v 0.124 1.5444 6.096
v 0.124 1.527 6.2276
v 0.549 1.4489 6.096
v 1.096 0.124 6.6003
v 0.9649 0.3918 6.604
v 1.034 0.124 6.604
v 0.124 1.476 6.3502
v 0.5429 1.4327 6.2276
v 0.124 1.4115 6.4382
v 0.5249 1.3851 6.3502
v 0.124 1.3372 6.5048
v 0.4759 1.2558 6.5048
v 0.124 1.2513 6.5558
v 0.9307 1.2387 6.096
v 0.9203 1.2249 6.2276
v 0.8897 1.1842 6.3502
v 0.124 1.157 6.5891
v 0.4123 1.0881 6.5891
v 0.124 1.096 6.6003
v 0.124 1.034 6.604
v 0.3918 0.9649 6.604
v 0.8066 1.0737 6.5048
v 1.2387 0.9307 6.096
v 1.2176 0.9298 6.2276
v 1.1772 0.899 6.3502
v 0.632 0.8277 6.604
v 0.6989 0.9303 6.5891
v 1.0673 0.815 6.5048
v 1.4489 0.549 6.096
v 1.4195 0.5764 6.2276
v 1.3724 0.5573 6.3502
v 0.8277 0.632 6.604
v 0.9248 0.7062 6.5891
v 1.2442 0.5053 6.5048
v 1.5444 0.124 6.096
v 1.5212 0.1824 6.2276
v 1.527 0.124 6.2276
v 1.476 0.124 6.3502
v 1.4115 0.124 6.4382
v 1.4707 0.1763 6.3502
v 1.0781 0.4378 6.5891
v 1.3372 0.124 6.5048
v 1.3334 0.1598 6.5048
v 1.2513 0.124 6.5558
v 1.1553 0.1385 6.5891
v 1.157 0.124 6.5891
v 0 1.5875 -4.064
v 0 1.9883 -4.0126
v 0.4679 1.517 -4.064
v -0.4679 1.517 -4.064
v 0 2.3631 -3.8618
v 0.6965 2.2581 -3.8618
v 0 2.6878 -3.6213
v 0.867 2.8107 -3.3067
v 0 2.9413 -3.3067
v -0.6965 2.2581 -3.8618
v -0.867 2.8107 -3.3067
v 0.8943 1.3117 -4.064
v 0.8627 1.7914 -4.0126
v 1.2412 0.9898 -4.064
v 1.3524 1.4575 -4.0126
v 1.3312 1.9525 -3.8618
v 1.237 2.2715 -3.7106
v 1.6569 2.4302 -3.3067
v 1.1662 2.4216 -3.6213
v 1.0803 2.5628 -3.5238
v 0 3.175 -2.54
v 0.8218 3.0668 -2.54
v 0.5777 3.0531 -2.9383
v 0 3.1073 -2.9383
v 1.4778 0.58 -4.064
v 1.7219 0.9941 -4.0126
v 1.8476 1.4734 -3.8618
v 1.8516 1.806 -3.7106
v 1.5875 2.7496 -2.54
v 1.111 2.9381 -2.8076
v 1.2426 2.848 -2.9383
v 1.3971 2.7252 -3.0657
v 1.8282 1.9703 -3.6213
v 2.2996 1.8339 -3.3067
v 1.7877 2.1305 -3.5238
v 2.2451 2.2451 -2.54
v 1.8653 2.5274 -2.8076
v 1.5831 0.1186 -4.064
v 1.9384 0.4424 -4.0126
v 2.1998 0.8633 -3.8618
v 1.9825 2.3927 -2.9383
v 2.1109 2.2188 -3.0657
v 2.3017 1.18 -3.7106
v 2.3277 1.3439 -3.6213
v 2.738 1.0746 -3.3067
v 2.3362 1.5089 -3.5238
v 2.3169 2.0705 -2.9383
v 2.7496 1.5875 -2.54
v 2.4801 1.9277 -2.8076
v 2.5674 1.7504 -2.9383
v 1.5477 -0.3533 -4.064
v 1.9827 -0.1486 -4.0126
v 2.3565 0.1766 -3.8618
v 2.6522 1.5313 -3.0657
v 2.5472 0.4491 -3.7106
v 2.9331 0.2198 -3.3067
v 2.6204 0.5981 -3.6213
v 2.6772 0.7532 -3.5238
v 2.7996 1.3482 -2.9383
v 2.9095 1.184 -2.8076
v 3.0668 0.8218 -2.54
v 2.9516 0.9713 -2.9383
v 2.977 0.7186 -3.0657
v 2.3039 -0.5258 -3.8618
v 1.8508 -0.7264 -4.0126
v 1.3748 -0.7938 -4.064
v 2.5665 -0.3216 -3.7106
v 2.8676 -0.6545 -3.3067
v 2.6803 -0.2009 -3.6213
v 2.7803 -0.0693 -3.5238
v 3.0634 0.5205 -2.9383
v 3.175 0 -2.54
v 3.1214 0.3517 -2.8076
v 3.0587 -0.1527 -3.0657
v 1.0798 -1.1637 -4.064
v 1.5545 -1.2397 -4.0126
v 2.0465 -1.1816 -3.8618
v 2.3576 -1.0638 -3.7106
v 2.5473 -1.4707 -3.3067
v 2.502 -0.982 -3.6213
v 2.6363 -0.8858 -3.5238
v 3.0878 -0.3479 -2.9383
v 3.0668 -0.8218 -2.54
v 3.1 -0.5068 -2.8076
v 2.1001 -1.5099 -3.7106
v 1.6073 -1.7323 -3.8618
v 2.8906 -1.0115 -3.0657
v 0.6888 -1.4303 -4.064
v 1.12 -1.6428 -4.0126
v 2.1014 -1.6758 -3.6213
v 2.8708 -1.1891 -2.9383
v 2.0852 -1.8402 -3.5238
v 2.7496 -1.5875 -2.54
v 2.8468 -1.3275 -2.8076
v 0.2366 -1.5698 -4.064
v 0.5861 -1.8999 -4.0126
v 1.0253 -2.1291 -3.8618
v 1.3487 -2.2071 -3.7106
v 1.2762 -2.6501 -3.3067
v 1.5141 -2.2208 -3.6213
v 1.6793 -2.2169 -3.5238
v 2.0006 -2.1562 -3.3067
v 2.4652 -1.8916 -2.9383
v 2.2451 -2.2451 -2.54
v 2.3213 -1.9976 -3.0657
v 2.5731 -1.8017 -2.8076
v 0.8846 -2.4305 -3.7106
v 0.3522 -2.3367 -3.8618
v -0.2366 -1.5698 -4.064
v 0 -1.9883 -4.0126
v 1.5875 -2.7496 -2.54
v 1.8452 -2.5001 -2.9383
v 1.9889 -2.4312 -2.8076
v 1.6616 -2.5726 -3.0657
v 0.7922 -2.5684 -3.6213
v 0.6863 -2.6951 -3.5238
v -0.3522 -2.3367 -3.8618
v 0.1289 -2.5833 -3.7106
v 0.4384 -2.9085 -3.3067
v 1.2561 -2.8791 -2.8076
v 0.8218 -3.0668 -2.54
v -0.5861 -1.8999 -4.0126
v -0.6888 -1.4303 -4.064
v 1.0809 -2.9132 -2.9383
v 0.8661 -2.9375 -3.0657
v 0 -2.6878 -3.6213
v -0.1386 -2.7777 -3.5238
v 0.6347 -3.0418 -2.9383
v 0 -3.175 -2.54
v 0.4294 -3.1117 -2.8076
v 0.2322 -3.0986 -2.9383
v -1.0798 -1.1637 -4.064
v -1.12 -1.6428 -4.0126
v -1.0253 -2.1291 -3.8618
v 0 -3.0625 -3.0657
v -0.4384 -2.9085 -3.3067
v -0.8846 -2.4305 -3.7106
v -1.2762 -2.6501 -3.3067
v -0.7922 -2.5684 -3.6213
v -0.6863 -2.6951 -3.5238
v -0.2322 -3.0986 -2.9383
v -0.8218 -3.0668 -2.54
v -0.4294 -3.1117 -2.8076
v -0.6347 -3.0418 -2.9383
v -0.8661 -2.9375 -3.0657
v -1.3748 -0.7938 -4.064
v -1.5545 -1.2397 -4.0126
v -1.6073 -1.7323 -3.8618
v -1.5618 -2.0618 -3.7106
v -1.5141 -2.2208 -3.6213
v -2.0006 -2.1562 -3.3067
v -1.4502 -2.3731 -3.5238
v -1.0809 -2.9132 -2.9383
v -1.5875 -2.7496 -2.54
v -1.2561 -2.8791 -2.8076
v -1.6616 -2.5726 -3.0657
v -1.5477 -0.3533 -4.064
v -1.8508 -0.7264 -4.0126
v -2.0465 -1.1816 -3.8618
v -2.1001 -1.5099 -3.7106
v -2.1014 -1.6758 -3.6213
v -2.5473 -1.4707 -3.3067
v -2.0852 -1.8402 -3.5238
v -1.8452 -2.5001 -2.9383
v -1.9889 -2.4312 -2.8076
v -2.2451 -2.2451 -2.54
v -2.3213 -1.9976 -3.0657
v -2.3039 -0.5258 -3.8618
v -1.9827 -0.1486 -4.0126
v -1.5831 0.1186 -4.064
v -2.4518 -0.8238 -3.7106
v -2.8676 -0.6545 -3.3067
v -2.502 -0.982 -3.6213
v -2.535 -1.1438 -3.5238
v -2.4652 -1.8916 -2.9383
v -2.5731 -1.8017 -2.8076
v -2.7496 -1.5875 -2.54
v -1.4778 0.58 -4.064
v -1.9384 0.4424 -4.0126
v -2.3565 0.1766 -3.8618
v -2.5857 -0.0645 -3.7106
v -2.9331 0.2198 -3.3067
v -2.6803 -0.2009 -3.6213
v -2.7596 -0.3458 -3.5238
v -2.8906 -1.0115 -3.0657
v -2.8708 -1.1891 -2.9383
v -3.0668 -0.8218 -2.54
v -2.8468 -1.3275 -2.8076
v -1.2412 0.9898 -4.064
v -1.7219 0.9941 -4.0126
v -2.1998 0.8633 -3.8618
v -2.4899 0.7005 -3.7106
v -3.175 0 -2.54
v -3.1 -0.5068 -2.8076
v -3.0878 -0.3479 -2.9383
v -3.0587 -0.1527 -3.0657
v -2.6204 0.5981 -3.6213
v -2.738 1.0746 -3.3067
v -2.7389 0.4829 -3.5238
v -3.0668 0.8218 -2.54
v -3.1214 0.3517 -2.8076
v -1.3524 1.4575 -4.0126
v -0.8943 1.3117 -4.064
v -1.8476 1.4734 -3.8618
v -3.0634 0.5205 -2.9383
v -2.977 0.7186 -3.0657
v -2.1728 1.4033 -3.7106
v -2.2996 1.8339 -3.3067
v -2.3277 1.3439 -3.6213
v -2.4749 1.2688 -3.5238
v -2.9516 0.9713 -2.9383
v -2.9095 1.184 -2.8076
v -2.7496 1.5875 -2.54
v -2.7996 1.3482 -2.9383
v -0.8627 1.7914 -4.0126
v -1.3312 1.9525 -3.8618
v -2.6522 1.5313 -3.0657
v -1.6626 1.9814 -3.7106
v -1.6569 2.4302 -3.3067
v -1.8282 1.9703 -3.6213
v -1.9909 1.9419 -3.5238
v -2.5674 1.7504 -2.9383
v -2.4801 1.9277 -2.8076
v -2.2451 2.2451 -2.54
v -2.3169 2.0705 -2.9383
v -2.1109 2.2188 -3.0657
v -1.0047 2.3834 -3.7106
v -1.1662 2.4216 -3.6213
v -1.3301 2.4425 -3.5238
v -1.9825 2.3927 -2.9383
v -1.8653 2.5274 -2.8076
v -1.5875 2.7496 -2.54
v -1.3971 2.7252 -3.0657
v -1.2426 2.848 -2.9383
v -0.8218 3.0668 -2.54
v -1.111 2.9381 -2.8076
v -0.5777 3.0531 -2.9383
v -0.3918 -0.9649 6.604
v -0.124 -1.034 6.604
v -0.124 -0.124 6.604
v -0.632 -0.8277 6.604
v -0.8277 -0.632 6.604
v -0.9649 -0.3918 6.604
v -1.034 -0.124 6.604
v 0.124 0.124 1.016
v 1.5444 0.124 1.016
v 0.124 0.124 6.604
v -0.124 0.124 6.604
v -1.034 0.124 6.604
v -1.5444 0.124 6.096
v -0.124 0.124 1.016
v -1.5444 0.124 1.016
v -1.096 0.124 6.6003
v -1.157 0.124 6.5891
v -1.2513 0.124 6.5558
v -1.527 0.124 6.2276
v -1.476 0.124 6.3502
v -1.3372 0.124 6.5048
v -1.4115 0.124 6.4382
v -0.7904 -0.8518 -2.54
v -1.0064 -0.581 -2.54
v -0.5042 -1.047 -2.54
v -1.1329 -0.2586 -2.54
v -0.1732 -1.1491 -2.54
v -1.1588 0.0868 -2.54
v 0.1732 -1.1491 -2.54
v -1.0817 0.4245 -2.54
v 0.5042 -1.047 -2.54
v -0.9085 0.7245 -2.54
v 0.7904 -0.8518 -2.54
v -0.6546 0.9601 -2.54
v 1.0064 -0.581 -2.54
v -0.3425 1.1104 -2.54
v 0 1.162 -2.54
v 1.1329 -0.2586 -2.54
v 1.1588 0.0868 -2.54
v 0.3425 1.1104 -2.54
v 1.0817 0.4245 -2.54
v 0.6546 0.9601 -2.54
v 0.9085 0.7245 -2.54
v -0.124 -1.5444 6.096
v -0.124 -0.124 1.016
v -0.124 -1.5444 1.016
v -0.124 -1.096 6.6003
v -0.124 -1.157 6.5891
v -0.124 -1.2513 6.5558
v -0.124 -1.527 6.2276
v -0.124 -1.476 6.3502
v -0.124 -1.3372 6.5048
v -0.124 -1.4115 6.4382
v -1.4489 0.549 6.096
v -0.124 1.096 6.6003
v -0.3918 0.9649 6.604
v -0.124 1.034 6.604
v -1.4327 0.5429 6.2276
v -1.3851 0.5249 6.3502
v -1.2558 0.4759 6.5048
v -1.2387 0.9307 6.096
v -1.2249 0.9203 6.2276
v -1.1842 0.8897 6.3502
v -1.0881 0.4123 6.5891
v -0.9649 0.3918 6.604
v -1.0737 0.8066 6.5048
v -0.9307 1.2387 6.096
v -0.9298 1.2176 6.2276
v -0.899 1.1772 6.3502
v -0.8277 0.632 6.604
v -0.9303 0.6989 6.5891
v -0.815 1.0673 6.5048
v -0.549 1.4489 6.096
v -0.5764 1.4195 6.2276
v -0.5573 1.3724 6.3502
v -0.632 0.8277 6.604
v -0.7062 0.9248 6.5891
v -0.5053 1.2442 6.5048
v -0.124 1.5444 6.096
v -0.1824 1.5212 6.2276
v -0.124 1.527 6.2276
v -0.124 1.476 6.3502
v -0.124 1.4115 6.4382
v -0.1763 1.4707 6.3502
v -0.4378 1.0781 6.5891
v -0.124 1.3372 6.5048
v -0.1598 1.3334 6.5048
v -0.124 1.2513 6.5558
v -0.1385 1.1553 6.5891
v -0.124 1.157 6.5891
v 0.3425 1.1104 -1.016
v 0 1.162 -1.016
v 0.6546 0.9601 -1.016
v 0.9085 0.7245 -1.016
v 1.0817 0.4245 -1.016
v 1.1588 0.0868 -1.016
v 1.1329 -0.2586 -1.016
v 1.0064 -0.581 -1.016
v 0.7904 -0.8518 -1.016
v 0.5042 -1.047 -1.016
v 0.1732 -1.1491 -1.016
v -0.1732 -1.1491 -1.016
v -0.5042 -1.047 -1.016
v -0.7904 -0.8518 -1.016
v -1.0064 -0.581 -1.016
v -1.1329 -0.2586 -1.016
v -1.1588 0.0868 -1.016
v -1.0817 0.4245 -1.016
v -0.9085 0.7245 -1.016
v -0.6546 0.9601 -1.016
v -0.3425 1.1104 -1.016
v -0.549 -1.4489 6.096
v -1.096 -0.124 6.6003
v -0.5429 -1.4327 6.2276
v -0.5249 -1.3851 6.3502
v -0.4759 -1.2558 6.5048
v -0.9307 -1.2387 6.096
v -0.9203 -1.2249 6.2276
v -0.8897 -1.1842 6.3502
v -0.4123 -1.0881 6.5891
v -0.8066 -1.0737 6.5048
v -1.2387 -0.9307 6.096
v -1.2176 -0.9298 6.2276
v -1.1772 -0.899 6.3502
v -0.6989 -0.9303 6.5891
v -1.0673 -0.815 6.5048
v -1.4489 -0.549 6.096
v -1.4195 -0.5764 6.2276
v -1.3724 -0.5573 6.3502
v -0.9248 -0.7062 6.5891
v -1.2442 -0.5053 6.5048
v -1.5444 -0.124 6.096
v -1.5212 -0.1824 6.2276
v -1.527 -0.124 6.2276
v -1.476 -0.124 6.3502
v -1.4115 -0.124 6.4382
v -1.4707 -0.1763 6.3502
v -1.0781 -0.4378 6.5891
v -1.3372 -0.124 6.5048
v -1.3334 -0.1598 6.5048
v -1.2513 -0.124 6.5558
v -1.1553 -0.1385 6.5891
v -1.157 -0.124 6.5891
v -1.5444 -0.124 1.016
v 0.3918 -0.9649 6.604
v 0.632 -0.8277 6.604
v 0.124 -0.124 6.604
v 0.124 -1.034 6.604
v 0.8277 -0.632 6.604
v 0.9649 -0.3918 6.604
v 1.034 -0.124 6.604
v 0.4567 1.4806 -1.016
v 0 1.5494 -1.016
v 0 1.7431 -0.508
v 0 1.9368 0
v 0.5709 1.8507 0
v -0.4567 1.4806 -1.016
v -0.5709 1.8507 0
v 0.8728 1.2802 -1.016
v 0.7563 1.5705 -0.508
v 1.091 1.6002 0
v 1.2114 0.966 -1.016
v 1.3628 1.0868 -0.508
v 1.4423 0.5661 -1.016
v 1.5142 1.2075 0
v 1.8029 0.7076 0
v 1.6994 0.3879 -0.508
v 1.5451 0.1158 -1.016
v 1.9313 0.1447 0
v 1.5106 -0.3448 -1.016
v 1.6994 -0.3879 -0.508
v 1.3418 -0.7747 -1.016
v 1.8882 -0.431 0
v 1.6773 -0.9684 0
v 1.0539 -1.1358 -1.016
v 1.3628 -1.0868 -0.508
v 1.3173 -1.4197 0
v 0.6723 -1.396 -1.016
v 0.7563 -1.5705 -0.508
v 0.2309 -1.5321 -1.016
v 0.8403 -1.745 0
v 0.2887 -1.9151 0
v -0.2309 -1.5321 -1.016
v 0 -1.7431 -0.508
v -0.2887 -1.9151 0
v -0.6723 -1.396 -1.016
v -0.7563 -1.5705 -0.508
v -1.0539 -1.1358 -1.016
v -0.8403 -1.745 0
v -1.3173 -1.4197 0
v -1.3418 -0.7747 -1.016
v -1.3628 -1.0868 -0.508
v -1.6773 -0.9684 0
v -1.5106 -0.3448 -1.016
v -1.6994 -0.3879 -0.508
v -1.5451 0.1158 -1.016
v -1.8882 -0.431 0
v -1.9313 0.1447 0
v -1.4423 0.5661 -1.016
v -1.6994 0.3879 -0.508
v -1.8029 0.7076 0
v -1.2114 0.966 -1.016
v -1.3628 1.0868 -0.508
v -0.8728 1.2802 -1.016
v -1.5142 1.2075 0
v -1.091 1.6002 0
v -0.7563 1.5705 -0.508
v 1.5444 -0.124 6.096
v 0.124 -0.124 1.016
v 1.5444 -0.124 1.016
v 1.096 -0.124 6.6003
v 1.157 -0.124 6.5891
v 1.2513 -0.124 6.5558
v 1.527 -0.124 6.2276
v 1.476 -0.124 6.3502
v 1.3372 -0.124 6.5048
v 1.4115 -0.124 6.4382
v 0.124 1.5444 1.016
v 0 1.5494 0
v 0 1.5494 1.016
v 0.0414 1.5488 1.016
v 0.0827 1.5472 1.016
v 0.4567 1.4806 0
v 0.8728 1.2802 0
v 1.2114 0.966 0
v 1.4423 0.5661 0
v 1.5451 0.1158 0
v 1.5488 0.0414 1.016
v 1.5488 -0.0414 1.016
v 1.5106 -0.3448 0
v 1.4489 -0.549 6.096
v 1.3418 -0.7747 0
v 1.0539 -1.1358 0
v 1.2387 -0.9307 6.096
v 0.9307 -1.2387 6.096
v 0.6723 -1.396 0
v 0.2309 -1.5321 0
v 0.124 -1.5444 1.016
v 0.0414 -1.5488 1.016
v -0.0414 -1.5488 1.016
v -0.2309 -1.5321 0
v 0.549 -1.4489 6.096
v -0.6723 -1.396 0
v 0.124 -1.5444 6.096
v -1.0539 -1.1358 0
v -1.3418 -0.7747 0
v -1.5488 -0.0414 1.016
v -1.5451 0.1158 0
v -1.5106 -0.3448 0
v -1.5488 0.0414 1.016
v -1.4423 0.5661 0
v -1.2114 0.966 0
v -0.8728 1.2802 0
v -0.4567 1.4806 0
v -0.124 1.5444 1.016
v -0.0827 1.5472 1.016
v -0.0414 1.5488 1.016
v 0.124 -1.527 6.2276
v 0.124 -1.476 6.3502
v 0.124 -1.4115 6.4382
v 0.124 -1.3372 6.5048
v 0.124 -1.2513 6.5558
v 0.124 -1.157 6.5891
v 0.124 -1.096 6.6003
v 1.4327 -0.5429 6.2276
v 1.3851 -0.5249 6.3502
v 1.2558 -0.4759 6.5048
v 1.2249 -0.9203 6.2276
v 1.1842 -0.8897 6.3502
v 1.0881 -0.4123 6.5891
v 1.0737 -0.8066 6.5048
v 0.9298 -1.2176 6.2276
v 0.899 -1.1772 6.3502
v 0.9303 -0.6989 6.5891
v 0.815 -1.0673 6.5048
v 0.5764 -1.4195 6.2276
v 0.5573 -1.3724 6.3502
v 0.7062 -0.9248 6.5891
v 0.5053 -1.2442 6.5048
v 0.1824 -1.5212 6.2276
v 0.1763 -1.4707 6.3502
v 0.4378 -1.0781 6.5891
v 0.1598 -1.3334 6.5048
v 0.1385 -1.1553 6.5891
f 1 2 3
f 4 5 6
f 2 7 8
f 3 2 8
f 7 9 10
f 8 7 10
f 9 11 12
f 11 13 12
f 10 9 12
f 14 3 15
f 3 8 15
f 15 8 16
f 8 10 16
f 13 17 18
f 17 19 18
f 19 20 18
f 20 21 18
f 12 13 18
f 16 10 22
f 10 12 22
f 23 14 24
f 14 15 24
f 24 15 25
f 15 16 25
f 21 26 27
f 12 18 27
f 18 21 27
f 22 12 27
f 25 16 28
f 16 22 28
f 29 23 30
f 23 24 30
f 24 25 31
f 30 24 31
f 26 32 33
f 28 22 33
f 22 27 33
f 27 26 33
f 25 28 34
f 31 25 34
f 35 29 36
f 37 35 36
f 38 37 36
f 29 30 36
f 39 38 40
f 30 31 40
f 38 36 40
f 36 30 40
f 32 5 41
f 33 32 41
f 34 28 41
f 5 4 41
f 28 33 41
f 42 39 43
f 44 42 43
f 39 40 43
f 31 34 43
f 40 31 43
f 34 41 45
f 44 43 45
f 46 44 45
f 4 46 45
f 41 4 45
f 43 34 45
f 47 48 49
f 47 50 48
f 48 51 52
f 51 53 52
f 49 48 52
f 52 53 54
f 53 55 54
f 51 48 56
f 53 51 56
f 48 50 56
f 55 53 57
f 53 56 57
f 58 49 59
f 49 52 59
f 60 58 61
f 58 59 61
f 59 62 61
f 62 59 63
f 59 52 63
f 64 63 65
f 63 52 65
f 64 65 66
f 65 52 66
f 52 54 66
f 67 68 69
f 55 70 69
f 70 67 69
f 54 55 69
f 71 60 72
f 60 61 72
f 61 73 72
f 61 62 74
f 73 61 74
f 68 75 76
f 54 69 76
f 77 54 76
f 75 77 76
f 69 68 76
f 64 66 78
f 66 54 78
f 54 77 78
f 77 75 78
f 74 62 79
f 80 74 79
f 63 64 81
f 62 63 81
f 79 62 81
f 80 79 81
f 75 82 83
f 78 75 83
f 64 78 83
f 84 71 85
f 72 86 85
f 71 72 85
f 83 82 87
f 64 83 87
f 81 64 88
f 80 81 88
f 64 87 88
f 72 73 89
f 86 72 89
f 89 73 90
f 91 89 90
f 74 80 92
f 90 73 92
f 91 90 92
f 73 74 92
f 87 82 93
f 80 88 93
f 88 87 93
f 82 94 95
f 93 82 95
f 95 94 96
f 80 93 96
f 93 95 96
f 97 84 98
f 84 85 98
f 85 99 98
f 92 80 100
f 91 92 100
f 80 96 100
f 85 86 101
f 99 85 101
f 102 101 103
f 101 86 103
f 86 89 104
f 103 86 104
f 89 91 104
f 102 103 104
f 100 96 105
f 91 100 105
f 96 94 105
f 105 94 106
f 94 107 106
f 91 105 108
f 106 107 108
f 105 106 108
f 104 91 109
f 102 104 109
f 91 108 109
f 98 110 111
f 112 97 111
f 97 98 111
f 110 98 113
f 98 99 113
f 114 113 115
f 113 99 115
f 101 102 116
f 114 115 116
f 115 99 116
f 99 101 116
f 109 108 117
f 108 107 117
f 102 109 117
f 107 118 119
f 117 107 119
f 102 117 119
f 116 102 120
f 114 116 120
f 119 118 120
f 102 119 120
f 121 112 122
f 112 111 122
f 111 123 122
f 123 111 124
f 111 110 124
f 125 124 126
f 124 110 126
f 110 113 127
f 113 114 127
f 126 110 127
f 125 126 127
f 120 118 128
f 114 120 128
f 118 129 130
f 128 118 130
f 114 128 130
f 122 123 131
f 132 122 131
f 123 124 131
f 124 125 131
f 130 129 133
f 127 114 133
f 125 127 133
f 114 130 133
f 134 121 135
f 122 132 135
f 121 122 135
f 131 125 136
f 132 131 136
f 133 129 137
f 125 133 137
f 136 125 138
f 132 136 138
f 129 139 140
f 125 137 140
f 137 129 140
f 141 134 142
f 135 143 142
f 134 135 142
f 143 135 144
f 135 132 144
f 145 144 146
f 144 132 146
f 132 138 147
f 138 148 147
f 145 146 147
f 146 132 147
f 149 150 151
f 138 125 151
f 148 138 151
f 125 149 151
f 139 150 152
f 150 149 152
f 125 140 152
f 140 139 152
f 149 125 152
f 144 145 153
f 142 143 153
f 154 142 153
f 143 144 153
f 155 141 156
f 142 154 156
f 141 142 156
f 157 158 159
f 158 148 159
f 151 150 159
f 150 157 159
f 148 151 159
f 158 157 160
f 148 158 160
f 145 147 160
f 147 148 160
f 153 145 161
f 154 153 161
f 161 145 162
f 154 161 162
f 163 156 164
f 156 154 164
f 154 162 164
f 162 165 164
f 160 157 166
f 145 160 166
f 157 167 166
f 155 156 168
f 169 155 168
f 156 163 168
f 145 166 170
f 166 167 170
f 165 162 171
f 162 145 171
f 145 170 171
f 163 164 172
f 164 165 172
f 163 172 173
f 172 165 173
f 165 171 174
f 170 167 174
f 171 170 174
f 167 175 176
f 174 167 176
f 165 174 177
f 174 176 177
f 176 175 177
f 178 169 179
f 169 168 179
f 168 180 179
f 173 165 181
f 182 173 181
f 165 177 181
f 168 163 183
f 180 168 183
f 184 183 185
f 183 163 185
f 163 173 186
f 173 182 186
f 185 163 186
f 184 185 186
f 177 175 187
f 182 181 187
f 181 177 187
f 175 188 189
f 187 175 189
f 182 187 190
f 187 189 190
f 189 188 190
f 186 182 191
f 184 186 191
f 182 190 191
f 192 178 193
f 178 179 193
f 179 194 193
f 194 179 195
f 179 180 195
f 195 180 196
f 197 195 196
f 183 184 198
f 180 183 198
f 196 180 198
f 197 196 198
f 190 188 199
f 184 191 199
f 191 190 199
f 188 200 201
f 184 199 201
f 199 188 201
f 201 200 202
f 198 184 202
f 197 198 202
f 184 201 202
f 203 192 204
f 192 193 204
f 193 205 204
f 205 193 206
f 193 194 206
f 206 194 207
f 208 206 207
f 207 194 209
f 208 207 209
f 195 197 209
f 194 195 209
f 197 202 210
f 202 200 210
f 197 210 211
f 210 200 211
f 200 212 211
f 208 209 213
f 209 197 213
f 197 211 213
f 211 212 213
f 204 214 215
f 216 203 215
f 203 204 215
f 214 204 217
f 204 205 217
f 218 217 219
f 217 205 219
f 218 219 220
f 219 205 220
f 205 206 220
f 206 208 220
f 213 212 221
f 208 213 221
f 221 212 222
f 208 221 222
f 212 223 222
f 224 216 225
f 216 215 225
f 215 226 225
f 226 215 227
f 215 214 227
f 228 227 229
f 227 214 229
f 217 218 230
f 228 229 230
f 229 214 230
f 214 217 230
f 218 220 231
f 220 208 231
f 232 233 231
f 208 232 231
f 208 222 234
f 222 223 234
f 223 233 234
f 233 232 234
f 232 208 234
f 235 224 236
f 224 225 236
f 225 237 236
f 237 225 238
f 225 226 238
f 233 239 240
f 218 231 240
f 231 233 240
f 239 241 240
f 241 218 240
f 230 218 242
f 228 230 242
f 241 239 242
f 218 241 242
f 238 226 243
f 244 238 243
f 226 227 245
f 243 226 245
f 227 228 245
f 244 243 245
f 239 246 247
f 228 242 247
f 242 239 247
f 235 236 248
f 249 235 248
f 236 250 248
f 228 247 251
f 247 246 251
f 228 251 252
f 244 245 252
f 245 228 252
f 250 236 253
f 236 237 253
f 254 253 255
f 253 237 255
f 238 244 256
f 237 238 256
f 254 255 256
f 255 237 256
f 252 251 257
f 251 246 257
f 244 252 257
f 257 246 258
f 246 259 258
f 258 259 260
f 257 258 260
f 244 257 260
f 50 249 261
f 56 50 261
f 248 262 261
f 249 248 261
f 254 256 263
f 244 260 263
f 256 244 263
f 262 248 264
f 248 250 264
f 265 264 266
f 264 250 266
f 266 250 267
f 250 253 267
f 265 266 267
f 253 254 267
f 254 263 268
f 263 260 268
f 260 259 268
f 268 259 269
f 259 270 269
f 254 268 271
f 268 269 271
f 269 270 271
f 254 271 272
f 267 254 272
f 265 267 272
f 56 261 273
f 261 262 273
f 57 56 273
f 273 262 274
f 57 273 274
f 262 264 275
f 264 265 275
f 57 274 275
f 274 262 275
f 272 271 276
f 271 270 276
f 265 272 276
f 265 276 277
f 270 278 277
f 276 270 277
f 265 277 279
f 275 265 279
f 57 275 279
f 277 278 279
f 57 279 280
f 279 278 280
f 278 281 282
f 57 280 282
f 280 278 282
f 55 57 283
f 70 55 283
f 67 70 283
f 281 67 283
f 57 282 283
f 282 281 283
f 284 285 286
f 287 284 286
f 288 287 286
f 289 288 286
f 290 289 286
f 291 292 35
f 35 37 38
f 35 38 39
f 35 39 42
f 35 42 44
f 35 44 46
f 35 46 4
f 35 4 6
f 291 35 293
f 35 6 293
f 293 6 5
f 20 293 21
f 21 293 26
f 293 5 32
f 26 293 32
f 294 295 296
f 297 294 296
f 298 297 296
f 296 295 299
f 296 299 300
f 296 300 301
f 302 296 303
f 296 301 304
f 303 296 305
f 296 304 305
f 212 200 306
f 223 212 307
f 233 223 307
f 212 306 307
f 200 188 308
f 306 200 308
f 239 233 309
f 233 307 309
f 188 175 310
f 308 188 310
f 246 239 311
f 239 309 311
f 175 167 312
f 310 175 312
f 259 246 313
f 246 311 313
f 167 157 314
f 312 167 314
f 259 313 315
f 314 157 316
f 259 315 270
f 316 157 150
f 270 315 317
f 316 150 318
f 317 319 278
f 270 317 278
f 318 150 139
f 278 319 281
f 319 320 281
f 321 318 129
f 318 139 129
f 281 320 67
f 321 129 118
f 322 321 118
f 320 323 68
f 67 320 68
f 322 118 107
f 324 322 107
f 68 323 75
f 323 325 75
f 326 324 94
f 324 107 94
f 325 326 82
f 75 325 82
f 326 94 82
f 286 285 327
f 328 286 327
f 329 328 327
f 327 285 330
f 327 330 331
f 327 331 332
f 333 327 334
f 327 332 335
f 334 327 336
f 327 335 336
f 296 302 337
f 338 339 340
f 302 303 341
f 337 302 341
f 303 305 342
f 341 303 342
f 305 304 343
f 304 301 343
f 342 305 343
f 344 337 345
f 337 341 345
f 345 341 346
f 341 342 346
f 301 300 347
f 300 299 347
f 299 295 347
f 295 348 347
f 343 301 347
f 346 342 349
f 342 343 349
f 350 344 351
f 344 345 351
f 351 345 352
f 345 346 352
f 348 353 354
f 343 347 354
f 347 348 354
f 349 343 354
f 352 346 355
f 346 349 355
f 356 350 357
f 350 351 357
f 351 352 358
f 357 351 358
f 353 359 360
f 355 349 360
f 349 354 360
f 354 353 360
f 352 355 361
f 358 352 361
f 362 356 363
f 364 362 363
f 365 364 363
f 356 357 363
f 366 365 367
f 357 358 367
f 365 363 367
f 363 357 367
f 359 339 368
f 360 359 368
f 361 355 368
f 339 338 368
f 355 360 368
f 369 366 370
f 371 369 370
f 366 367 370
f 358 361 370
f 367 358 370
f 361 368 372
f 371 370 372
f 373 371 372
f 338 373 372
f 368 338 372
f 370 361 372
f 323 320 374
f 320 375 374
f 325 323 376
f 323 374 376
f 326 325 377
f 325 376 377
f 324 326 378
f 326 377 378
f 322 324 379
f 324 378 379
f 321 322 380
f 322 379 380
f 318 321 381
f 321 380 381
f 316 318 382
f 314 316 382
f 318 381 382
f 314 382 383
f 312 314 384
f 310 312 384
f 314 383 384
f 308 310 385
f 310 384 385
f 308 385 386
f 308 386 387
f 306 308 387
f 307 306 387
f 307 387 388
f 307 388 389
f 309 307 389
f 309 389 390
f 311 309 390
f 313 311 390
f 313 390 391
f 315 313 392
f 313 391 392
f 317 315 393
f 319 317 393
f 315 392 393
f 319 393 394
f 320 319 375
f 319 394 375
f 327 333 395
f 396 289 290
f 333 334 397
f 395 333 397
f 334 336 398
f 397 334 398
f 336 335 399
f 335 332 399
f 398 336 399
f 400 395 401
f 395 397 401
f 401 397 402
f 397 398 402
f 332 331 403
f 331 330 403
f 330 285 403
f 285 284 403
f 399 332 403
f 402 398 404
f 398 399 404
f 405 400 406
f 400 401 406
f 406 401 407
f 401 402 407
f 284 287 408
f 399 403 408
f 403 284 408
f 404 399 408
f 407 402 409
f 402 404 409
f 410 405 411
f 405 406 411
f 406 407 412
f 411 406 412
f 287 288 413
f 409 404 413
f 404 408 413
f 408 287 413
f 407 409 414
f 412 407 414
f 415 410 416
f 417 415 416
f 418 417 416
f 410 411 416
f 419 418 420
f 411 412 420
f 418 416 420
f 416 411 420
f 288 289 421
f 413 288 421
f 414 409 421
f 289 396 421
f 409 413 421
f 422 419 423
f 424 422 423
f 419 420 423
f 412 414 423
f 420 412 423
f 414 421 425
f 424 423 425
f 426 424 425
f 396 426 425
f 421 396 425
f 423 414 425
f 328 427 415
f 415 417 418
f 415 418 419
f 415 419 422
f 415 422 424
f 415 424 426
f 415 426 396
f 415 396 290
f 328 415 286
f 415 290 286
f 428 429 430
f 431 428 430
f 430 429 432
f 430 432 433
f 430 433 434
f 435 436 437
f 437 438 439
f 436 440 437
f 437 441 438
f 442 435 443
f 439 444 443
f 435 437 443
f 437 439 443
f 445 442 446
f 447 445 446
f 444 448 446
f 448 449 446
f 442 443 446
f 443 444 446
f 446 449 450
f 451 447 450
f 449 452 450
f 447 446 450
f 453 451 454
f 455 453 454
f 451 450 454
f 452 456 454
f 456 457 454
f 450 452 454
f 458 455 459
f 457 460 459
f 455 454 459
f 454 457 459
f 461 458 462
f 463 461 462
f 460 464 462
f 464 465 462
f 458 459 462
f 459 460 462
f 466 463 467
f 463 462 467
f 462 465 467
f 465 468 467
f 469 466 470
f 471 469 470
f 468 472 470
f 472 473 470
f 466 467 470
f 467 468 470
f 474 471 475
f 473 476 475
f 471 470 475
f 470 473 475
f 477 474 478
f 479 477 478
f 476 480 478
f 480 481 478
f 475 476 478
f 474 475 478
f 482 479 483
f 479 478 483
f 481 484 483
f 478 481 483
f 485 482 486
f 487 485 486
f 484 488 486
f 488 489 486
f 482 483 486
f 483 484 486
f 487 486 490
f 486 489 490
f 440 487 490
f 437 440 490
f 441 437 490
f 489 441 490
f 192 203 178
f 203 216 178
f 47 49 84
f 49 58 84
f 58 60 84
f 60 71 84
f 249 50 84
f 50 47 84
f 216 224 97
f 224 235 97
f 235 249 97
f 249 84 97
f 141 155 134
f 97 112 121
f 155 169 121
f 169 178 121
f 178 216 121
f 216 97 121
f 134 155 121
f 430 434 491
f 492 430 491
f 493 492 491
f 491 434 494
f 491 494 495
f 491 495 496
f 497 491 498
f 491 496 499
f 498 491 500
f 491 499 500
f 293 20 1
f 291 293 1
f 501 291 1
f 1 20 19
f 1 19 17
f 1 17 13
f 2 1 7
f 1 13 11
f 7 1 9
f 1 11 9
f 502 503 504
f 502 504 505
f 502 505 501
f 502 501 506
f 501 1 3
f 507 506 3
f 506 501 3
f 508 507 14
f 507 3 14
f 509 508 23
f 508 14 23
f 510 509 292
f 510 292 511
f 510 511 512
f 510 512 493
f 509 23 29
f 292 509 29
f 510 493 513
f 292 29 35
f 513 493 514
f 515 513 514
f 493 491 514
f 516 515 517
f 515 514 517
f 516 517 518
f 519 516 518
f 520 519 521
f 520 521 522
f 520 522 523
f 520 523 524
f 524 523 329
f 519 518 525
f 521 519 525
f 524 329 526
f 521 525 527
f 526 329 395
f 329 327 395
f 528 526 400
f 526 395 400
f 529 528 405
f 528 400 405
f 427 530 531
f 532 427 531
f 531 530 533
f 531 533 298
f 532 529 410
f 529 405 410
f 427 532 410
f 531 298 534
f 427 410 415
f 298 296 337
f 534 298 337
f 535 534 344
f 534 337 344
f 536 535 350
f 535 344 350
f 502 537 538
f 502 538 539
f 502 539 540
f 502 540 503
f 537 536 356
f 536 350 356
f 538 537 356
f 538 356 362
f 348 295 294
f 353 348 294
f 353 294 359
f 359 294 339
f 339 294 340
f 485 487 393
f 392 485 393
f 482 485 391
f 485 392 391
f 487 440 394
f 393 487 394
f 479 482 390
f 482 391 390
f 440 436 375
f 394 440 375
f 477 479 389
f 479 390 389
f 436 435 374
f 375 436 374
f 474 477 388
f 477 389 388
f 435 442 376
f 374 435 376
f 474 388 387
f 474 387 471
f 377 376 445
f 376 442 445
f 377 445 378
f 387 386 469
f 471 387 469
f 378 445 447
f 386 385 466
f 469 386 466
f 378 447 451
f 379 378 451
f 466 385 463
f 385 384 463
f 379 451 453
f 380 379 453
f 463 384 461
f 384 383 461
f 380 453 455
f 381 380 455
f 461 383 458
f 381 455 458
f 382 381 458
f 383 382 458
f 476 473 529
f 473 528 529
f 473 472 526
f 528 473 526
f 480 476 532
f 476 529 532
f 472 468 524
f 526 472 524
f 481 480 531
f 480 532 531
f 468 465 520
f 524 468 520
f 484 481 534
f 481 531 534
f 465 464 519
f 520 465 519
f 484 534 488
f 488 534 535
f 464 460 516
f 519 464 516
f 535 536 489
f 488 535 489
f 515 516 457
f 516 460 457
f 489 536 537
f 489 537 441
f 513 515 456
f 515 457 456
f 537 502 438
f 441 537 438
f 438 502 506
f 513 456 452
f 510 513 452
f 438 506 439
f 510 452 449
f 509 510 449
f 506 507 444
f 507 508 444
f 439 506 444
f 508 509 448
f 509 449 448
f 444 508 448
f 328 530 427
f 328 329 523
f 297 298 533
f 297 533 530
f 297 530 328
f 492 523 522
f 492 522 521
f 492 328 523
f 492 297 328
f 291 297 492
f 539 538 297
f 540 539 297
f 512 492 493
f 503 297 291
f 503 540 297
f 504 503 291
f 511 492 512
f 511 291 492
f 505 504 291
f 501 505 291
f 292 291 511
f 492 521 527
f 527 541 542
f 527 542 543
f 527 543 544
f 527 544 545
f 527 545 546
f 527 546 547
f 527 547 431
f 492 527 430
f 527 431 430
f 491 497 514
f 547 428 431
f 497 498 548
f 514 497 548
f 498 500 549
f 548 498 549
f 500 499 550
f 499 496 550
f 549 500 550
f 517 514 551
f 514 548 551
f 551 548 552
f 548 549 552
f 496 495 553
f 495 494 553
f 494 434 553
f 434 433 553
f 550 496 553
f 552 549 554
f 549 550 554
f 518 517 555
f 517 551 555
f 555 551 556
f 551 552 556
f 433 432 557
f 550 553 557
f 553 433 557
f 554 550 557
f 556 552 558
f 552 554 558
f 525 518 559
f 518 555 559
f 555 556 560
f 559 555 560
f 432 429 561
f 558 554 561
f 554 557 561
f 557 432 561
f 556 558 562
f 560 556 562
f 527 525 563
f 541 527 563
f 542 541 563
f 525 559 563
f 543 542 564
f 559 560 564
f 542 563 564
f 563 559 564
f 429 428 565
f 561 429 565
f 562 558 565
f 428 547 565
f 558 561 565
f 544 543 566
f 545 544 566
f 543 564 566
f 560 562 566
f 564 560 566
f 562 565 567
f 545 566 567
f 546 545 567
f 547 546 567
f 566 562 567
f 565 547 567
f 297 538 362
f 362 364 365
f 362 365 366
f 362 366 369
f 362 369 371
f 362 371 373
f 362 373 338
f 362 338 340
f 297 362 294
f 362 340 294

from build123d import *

# Parameters (mm, degrees)
SKETCH3_W          = 0.247904
SKETCH3_H          = 0.247904
CUT_EXTRUDE1_DEPTH = 5.588
FILLET1_R          = 0.508


with BuildPart() as part:
    # Sketch2 → Revolve1 (revolve)
    with BuildSketch(Plane(origin=(0, 0, 0), x_dir=(0, 0, -1), z_dir=(1, 0, 0))):
        with BuildLine():
            Line((2.54, 3.175), (2.54, 1.16205))
            Line((2.54, 1.16205), (1.016, 1.16205))
            Line((1.016, 1.16205), (1.016, 1.5494))
            Line((1.016, 1.5494), (0, 1.93675))
            Line((0, 1.93675), (0, 1.5494))
            Line((0, 1.5494), (-6.604, 1.5494))
            Line((-6.604, 1.5494), (-6.604, 0))
            Line((-6.604, 0), (4.064, 0))
            Line((4.064, 0), (4.064, 1.5875))
            ThreePointArc((4.064, 1.5875), (3.621333791, 2.687810439), (2.54, 3.175))
        make_face()
    revolve(axis=Axis((0, 0, 6.604), (0, 0, -1)))

    # Sketch3 → Cut-Extrude1 (cut)
    with BuildSketch(Plane.XY.offset(6.604)):
        with BuildLine():
            Line((0.123952, 3.172579534), (-0.123952, 3.172579534))
            Line((-0.123952, 3.172579534), (-0.123952, 1.544433962))
            ThreePointArc((-0.123952, 1.544433962), (0, 1.5494), (0.123952, 1.544433962))
            Line((0.123952, 1.544433962), (0.123952, 3.172579534))
        make_face()
        with BuildLine():
            ThreePointArc((0.123952, 1.544433962), (0, 1.5494), (-0.123952, 1.544433962))
            Line((-0.123952, 1.544433962), (-0.123952, 0.123952))
            Line((-0.123952, 0.123952), (0.123952, 0.123952))
            Line((0.123952, 0.123952), (0.123952, 1.544433962))
        make_face()
        with BuildLine():
            ThreePointArc((-1.544433962, -0.123952), (-1.5494, 0), (-1.544433962, 0.123952))
            Line((-1.544433962, 0.123952), (-3.172579534, 0.123952))
            Line((-3.172579534, 0.123952), (-3.172579534, -0.123952))
            Line((-3.172579534, -0.123952), (-1.544433962, -0.123952))
        make_face()
        with BuildLine():
            Line((3.172579534, 0.123952), (1.544433962, 0.123952))
            ThreePointArc((1.544433962, 0.123952), (1.548157993, 0.06202572), (1.5494, 0))
            ThreePointArc((1.5494, 0), (1.548157993, -0.06202572), (1.544433962, -0.123952))
            Line((1.544433962, -0.123952), (3.172579534, -0.123952))
            Line((3.172579534, -0.123952), (3.172579534, 0.123952))
        make_face()
        with BuildLine():
            Line((0.123952, -0.123952), (-0.123952, -0.123952))
            Line((-0.123952, -0.123952), (-0.123952, -1.544433962))
            ThreePointArc((-0.123952, -1.544433962), (0, -1.5494), (0.123952, -1.544433962))
            Line((0.123952, -1.544433962), (0.123952, -0.123952))
        make_face()
        with BuildLine():
            Line((1.544433962, 0.123952), (0.123952, 0.123952))
            Line((0.123952, 0.123952), (0.123952, -0.123952))
            Line((0.123952, -0.123952), (1.544433962, -0.123952))
            ThreePointArc((1.544433962, -0.123952), (1.548157993, -0.06202572), (1.5494, 0))
            ThreePointArc((1.5494, 0), (1.548157993, 0.06202572), (1.544433962, 0.123952))
        make_face()
        with BuildLine():
            Line((-0.123952, -0.123952), (-0.123952, 0.123952))
            Line((-0.123952, 0.123952), (-1.544433962, 0.123952))
            ThreePointArc((-1.544433962, 0.123952), (-1.5494, 0), (-1.544433962, -0.123952))
            Line((-1.544433962, -0.123952), (-0.123952, -0.123952))
        make_face()
        Rectangle(SKETCH3_W, SKETCH3_H)
        with BuildLine():
            ThreePointArc((0.123952, -1.544433962), (0, -1.5494), (-0.123952, -1.544433962))
            Line((-0.123952, -1.544433962), (-0.123952, -3.172579534))
            Line((-0.123952, -3.172579534), (0.123952, -3.172579534))
            Line((0.123952, -3.172579534), (0.123952, -1.544433962))
        make_face()
    extrude(amount=-CUT_EXTRUDE1_DEPTH, mode=Mode.SUBTRACT)

    # Fillet1
    fillet1_edges = [part.edges().sort_by_distance(p)[0] for p in [
        (1.095591247, -1.095591247, 6.604),
        (1.095591247, 1.095591247, 6.604),
        (-1.095591247, 1.095591247, 6.604),
        (-1.095591247, -1.095591247, 6.604),
    ]]
    fillet(fillet1_edges, radius=FILLET1_R)


solid = part.part
